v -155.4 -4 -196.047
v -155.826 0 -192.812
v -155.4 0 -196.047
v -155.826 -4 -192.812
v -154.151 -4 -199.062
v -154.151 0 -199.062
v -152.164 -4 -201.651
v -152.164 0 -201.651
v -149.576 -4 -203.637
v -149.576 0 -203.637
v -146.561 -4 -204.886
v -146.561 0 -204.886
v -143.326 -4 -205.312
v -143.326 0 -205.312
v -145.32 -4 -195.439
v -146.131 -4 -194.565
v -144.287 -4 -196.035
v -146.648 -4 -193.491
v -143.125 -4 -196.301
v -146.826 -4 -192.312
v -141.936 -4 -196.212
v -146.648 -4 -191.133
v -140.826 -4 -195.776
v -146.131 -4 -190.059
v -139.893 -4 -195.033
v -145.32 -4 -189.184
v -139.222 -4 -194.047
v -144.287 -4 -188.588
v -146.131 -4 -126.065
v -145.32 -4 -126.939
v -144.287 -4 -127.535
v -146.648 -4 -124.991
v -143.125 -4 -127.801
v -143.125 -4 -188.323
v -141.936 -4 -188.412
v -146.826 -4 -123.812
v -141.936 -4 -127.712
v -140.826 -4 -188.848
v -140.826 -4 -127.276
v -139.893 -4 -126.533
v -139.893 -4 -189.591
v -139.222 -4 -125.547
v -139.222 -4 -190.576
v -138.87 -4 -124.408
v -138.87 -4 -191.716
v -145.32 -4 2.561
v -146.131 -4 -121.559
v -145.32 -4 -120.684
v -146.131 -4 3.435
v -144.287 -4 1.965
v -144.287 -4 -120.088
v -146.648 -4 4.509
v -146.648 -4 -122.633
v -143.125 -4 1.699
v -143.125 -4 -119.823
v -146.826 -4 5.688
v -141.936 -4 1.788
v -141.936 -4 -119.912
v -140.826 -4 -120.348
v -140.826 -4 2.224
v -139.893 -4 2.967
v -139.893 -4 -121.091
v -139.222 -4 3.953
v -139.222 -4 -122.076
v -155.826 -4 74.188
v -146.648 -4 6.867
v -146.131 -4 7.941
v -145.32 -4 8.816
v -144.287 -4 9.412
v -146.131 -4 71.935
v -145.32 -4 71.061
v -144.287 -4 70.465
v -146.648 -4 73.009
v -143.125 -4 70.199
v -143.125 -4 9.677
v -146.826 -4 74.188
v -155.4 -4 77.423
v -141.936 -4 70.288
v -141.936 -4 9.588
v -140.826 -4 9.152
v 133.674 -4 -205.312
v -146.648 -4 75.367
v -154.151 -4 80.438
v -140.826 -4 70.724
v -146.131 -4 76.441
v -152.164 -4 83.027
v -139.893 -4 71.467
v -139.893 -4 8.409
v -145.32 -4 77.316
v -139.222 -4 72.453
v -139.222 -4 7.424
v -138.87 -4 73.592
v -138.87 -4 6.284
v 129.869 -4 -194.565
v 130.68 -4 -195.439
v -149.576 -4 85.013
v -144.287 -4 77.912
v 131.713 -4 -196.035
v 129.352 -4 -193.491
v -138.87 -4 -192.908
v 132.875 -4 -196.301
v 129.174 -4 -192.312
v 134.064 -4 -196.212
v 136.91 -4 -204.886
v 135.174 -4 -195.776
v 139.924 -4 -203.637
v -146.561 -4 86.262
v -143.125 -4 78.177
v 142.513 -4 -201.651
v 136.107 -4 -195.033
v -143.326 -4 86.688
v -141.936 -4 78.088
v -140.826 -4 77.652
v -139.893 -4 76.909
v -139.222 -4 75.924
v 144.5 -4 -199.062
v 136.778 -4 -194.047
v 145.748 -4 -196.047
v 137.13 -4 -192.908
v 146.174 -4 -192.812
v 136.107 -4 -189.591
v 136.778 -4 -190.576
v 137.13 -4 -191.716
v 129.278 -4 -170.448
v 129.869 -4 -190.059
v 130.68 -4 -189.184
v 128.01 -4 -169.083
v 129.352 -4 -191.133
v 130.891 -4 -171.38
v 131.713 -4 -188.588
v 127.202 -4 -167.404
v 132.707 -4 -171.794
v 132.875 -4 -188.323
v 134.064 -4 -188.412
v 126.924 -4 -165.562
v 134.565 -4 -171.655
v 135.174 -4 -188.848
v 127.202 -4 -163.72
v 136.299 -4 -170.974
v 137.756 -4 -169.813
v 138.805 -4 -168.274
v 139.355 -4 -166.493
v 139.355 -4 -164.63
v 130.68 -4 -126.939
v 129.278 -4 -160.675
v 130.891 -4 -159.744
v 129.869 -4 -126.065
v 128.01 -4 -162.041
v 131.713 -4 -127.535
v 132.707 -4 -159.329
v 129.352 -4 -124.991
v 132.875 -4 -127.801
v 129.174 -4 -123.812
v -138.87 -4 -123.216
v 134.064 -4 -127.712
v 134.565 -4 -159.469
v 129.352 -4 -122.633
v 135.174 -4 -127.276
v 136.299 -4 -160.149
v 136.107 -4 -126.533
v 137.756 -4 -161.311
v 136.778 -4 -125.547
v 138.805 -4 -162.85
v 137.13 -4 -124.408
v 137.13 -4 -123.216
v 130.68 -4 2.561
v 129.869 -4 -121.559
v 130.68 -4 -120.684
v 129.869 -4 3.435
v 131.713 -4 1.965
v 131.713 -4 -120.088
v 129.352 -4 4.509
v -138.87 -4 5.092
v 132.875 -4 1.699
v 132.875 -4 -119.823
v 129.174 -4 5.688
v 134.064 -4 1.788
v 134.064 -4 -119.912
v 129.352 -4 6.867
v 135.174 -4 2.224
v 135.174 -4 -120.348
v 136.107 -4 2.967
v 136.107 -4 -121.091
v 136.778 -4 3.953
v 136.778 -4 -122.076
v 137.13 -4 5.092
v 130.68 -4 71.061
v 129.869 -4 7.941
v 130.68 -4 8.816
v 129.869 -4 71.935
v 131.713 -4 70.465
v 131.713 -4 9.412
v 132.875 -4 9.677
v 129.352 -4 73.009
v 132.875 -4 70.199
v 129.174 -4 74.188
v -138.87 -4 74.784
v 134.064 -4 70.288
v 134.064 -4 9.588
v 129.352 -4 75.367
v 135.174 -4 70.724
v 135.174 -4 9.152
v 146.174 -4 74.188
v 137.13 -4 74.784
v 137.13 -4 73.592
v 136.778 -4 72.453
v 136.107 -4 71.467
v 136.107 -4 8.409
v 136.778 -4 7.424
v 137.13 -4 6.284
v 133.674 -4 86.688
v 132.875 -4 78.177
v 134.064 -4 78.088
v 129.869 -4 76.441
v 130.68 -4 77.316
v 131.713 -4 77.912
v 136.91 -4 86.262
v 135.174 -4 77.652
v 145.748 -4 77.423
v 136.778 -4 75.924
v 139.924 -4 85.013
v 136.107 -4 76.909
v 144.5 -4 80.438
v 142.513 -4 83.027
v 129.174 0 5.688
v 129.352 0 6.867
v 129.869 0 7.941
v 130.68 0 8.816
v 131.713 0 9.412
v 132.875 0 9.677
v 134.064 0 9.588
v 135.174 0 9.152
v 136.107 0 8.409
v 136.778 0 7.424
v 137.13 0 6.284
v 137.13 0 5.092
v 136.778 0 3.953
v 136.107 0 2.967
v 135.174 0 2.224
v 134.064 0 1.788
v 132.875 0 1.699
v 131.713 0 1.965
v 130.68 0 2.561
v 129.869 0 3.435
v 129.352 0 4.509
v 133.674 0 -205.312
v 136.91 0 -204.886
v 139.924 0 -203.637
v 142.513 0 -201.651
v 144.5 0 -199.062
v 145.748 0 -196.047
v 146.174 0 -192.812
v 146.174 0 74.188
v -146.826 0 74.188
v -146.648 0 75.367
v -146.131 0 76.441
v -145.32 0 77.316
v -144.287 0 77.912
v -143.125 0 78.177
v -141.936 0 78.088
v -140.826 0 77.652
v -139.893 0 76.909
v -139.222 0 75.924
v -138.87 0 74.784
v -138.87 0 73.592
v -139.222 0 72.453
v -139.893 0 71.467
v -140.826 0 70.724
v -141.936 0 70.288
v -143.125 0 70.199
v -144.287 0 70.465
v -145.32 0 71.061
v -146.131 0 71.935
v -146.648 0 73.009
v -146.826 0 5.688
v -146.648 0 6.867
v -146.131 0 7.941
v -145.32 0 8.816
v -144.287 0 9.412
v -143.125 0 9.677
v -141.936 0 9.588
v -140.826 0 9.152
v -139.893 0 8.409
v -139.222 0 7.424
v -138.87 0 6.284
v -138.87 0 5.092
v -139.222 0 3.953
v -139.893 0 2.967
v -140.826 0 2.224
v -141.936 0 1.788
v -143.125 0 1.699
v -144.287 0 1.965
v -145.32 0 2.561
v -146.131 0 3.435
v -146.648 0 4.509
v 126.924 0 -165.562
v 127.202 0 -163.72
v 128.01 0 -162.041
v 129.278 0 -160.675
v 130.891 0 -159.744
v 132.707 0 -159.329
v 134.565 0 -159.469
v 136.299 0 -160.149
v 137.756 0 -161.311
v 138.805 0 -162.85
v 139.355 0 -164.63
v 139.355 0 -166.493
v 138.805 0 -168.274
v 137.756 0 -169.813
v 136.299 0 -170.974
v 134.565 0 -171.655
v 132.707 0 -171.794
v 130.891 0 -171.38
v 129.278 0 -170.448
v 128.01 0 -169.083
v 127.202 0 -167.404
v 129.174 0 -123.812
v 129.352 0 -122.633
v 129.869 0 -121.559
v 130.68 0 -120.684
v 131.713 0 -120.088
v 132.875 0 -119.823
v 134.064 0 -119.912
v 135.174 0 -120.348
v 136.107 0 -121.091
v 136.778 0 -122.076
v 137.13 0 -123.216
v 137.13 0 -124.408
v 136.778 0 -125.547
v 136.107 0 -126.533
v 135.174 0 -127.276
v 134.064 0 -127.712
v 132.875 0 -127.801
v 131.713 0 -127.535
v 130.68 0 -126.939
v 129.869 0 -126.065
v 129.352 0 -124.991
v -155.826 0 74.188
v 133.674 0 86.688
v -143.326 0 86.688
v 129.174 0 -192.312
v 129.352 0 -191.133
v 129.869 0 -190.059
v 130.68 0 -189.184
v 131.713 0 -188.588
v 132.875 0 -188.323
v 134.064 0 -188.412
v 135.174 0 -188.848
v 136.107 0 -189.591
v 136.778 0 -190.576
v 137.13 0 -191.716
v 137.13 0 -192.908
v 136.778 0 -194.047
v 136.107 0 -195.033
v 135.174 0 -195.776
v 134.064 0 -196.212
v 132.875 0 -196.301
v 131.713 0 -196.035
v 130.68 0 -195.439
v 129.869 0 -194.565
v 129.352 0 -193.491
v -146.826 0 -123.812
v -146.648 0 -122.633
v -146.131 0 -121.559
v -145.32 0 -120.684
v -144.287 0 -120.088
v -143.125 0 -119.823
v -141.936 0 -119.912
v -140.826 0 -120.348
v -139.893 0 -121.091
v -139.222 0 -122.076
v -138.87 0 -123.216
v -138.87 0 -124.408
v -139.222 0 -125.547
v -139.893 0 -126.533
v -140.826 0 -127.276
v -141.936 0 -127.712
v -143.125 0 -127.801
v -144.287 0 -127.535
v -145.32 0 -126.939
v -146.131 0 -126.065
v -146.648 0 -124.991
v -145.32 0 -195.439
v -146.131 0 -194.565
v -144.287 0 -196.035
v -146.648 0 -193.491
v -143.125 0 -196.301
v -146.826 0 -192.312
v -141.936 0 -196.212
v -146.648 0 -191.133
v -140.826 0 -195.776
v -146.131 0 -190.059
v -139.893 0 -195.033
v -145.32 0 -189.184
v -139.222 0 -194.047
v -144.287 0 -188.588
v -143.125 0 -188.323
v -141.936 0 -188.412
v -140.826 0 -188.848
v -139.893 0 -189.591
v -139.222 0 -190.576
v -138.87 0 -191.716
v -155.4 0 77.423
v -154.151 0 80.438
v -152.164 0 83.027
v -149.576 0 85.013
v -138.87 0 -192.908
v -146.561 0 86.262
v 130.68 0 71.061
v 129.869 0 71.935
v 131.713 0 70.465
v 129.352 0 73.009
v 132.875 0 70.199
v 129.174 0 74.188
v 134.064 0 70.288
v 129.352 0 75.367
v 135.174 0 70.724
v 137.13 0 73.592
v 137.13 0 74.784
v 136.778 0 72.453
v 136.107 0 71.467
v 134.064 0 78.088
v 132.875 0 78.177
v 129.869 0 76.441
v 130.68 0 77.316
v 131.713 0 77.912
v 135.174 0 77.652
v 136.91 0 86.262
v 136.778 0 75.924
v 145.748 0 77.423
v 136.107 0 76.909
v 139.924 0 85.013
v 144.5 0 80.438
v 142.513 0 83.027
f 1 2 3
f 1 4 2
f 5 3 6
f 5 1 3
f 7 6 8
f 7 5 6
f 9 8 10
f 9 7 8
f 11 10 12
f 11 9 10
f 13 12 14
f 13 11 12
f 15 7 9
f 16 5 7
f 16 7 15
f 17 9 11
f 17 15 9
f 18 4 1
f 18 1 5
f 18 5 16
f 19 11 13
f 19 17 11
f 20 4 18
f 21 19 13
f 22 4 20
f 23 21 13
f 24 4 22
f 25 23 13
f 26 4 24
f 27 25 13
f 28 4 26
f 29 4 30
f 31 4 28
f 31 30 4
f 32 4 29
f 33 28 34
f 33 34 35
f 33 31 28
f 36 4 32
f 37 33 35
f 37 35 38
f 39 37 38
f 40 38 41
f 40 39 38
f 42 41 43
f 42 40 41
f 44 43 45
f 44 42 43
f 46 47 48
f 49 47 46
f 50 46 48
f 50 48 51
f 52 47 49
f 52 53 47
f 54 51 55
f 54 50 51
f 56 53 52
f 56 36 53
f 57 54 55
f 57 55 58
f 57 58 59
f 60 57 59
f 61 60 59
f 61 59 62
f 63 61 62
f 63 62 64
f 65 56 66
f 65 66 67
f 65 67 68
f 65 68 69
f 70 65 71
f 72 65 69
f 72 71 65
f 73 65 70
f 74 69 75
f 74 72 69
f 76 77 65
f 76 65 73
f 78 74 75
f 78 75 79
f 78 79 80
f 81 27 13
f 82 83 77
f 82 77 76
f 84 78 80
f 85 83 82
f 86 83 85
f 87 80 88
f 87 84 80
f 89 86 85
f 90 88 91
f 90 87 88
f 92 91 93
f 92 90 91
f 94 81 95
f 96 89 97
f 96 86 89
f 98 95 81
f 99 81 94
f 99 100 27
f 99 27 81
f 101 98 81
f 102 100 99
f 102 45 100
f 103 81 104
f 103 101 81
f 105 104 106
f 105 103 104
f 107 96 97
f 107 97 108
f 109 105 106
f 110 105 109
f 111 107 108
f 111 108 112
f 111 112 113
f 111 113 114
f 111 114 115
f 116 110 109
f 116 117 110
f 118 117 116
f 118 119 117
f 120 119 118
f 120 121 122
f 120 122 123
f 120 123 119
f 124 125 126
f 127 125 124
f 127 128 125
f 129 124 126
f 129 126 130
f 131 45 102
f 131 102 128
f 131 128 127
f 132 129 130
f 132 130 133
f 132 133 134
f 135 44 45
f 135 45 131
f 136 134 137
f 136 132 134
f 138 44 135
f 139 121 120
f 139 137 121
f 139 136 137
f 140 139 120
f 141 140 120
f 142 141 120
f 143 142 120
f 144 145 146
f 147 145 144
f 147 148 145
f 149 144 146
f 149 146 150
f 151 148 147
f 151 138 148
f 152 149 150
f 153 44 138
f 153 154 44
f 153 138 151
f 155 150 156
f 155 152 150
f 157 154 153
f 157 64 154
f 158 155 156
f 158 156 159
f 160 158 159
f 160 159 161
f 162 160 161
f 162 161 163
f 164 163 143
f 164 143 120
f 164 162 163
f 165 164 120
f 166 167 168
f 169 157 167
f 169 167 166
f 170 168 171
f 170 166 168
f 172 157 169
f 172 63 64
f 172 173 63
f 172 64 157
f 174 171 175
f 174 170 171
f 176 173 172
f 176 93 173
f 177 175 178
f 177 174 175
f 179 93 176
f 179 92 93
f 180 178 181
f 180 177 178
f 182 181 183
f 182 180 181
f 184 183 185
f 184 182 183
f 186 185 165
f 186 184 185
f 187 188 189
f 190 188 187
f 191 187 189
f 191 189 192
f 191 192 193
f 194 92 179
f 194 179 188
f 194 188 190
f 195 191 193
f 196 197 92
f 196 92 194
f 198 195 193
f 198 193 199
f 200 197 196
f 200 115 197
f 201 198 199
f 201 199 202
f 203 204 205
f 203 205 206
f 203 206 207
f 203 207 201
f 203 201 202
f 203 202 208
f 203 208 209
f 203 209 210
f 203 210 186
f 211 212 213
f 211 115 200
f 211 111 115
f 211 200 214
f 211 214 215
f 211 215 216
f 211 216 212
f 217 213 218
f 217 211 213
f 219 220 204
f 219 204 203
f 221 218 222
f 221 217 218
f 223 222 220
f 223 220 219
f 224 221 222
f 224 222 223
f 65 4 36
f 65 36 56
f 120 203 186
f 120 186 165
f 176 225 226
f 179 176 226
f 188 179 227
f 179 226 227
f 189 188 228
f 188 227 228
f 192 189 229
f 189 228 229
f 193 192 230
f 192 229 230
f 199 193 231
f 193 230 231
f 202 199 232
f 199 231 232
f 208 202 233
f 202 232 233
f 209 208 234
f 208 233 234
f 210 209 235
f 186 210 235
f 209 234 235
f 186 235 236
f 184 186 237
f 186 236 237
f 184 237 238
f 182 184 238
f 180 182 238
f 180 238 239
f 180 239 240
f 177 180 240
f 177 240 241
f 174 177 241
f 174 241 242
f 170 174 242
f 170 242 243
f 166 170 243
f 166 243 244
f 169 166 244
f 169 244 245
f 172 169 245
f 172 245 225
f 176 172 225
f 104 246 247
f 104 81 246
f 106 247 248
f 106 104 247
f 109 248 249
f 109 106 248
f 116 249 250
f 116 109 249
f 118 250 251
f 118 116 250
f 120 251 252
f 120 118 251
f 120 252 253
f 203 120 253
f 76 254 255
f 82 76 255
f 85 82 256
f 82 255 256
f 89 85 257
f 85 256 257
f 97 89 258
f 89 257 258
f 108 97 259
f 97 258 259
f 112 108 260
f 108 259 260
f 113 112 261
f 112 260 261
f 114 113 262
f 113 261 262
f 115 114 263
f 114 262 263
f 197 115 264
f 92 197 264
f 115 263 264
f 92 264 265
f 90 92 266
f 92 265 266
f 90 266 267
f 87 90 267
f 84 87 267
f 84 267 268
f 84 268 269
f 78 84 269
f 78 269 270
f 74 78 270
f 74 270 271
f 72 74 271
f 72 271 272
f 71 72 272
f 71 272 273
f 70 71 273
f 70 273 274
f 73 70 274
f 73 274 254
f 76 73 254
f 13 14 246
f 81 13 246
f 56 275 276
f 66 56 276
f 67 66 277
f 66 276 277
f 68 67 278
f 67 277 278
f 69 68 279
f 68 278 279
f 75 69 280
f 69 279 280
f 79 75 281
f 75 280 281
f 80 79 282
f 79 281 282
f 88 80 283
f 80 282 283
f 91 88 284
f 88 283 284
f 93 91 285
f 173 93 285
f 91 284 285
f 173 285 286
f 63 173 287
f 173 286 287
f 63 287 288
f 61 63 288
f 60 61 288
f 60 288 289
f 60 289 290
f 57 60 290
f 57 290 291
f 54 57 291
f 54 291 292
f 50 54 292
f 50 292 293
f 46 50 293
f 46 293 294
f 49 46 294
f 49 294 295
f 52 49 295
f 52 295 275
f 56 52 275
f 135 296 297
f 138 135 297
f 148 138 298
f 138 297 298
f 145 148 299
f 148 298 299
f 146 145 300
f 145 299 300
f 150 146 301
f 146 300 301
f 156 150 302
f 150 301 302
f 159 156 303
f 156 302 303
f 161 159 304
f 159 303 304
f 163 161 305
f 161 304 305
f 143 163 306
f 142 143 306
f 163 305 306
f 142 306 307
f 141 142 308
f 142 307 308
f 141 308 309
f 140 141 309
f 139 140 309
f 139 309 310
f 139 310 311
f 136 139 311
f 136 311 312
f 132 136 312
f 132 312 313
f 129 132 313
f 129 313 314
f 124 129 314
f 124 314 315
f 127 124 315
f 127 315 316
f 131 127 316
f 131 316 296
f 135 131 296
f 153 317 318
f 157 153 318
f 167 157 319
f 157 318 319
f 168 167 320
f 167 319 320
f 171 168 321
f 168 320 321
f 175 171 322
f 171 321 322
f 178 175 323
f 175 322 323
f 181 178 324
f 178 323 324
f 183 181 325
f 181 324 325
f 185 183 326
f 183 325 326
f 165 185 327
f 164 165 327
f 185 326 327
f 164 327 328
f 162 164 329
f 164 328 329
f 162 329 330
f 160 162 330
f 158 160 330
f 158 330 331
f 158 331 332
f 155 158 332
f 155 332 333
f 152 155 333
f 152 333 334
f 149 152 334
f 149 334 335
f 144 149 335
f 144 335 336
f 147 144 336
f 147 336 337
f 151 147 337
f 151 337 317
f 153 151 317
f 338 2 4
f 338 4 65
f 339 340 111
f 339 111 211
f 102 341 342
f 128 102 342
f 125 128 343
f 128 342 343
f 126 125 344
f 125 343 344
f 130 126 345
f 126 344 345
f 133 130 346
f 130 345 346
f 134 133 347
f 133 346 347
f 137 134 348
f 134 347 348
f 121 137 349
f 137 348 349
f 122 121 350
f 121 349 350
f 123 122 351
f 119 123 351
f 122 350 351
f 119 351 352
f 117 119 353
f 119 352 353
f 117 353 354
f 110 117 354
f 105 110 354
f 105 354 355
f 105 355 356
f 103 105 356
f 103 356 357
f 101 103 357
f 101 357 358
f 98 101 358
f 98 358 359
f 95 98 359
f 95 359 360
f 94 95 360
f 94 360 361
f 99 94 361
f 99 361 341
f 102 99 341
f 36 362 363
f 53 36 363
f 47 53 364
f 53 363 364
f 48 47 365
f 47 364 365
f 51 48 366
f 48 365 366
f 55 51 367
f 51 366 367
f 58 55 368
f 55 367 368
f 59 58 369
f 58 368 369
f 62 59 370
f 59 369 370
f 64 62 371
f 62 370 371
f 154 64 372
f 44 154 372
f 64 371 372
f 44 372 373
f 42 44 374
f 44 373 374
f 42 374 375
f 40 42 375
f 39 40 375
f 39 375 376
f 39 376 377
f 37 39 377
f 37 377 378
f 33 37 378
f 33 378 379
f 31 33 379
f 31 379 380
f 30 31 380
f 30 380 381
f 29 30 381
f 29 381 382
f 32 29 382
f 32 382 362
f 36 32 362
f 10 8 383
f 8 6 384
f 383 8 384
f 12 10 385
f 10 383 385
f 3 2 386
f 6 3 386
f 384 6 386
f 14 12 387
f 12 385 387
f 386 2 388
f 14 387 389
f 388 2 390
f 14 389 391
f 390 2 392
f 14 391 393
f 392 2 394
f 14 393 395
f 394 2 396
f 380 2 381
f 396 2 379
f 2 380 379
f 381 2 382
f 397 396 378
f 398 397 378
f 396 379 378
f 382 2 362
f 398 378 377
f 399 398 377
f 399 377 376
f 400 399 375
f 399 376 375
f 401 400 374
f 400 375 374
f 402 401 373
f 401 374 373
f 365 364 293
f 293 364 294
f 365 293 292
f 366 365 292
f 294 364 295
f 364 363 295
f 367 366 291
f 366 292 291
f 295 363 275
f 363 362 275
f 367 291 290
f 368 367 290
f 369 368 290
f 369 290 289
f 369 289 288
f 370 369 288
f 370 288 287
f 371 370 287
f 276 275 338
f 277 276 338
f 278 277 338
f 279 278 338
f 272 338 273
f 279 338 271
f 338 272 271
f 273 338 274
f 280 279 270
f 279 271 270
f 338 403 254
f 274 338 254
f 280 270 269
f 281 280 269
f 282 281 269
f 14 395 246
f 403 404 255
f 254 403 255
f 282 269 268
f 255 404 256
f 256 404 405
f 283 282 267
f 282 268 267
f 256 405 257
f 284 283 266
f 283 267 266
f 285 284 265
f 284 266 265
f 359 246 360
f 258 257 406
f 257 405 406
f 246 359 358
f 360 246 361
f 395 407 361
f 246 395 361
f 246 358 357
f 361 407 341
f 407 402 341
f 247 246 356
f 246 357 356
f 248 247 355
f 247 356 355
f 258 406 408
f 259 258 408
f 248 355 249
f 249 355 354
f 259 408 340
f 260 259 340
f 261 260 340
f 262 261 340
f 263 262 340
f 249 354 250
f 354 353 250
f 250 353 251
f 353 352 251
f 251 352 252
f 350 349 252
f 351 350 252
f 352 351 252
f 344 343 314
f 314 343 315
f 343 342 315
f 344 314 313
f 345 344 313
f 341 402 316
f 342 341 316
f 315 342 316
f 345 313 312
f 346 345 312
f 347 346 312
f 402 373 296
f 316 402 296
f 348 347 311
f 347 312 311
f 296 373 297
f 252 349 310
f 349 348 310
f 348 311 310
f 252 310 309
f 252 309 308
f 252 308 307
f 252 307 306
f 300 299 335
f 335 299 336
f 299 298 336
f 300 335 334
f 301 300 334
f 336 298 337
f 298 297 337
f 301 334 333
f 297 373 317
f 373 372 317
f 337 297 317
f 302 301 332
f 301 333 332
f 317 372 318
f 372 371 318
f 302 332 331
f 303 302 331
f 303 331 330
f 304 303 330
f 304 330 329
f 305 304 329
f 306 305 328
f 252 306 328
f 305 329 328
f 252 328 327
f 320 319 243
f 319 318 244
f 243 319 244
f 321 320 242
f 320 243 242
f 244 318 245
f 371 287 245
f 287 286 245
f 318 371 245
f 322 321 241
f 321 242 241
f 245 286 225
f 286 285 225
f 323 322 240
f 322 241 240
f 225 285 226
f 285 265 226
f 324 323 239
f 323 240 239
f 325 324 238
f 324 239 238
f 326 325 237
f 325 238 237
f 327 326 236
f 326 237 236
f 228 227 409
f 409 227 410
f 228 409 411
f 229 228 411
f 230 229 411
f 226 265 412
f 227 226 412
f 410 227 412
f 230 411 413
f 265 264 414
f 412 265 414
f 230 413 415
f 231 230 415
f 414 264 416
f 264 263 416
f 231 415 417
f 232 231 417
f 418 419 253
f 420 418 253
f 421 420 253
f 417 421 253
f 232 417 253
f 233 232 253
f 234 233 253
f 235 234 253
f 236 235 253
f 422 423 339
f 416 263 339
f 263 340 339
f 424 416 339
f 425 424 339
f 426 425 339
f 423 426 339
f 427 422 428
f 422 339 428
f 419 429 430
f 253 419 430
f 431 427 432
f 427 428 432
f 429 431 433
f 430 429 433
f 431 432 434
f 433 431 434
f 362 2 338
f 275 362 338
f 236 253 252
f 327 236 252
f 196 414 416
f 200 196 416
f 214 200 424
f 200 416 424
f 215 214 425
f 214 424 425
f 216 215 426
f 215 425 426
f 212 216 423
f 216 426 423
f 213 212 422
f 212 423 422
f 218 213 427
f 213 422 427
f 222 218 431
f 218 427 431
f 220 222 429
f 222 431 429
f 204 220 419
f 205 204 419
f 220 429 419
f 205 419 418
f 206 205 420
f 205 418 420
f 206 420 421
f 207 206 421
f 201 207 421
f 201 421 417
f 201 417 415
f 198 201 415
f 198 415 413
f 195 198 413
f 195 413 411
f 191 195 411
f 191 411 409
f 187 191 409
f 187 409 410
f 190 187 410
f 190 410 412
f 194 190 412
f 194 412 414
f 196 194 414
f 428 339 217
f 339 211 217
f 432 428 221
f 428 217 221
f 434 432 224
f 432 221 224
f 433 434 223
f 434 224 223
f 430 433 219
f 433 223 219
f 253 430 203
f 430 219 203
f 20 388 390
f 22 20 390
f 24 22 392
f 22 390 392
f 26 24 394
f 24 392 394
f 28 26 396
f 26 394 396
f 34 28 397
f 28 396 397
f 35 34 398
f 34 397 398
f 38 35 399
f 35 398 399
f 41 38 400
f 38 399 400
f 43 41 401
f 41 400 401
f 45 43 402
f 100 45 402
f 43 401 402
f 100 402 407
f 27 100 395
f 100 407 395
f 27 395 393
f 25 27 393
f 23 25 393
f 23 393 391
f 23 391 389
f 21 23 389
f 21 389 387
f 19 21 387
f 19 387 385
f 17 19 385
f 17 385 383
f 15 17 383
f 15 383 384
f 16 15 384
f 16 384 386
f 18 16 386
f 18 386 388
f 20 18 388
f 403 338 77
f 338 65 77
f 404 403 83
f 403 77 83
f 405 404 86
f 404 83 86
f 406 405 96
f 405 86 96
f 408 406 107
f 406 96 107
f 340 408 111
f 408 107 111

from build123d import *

# Parameters (mm, degrees)
F0_W     = 302
F0_H     = 292
F1_DEPTH = 4
F2_R     = 4
F2_R_2   = 6.25
F3_DEPTH = 25
F4_R     = 12.5


with BuildPart() as f1:
    # F0 (on Front) → F1 (new body)
    with BuildSketch(Plane.XZ):
        with Locations((-4.82562, -59.311821)):
            Rectangle(F0_W, F0_H)
    extrude(amount=F1_DEPTH)

    # F2 (on face) → F3 (cut)
    with BuildSketch(Plane(origin=(0, 0, 0), x_dir=(-1, 0, 0), z_dir=(0, 1, 0))):
        with Locations((-133.17438, -192.311821)):
            Circle(F2_R)
        with Locations((-133.17438, -123.811821)):
            Circle(F2_R)
        with Locations((-133.17438, 5.688179)):
            Circle(F2_R)
        with Locations((-133.17438, 74.188179)):
            Circle(F2_R)
        with Locations((142.82562, -192.311821)):
            Circle(F2_R)
        with Locations((142.82562, -123.811821)):
            Circle(F2_R)
        with Locations((142.82562, 5.688179)):
            Circle(F2_R)
        with Locations((142.82562, 74.188179)):
            Circle(F2_R)
        with Locations((-133.17438, -165.561821)):
            Circle(F2_R_2)
    extrude(amount=-F3_DEPTH, mode=Mode.SUBTRACT)

    # F4
    f4_edges = [f1.edges().sort_by_distance(p)[0] for p in [
        (146.17438, -2, 86.688179),
        (146.17438, -2, -205.311821),
        (-155.82562, -2, -205.311821),
        (-155.82562, -2, 86.688179),
    ]]
    fillet(f4_edges, radius=F4_R)


solid = f1.part
